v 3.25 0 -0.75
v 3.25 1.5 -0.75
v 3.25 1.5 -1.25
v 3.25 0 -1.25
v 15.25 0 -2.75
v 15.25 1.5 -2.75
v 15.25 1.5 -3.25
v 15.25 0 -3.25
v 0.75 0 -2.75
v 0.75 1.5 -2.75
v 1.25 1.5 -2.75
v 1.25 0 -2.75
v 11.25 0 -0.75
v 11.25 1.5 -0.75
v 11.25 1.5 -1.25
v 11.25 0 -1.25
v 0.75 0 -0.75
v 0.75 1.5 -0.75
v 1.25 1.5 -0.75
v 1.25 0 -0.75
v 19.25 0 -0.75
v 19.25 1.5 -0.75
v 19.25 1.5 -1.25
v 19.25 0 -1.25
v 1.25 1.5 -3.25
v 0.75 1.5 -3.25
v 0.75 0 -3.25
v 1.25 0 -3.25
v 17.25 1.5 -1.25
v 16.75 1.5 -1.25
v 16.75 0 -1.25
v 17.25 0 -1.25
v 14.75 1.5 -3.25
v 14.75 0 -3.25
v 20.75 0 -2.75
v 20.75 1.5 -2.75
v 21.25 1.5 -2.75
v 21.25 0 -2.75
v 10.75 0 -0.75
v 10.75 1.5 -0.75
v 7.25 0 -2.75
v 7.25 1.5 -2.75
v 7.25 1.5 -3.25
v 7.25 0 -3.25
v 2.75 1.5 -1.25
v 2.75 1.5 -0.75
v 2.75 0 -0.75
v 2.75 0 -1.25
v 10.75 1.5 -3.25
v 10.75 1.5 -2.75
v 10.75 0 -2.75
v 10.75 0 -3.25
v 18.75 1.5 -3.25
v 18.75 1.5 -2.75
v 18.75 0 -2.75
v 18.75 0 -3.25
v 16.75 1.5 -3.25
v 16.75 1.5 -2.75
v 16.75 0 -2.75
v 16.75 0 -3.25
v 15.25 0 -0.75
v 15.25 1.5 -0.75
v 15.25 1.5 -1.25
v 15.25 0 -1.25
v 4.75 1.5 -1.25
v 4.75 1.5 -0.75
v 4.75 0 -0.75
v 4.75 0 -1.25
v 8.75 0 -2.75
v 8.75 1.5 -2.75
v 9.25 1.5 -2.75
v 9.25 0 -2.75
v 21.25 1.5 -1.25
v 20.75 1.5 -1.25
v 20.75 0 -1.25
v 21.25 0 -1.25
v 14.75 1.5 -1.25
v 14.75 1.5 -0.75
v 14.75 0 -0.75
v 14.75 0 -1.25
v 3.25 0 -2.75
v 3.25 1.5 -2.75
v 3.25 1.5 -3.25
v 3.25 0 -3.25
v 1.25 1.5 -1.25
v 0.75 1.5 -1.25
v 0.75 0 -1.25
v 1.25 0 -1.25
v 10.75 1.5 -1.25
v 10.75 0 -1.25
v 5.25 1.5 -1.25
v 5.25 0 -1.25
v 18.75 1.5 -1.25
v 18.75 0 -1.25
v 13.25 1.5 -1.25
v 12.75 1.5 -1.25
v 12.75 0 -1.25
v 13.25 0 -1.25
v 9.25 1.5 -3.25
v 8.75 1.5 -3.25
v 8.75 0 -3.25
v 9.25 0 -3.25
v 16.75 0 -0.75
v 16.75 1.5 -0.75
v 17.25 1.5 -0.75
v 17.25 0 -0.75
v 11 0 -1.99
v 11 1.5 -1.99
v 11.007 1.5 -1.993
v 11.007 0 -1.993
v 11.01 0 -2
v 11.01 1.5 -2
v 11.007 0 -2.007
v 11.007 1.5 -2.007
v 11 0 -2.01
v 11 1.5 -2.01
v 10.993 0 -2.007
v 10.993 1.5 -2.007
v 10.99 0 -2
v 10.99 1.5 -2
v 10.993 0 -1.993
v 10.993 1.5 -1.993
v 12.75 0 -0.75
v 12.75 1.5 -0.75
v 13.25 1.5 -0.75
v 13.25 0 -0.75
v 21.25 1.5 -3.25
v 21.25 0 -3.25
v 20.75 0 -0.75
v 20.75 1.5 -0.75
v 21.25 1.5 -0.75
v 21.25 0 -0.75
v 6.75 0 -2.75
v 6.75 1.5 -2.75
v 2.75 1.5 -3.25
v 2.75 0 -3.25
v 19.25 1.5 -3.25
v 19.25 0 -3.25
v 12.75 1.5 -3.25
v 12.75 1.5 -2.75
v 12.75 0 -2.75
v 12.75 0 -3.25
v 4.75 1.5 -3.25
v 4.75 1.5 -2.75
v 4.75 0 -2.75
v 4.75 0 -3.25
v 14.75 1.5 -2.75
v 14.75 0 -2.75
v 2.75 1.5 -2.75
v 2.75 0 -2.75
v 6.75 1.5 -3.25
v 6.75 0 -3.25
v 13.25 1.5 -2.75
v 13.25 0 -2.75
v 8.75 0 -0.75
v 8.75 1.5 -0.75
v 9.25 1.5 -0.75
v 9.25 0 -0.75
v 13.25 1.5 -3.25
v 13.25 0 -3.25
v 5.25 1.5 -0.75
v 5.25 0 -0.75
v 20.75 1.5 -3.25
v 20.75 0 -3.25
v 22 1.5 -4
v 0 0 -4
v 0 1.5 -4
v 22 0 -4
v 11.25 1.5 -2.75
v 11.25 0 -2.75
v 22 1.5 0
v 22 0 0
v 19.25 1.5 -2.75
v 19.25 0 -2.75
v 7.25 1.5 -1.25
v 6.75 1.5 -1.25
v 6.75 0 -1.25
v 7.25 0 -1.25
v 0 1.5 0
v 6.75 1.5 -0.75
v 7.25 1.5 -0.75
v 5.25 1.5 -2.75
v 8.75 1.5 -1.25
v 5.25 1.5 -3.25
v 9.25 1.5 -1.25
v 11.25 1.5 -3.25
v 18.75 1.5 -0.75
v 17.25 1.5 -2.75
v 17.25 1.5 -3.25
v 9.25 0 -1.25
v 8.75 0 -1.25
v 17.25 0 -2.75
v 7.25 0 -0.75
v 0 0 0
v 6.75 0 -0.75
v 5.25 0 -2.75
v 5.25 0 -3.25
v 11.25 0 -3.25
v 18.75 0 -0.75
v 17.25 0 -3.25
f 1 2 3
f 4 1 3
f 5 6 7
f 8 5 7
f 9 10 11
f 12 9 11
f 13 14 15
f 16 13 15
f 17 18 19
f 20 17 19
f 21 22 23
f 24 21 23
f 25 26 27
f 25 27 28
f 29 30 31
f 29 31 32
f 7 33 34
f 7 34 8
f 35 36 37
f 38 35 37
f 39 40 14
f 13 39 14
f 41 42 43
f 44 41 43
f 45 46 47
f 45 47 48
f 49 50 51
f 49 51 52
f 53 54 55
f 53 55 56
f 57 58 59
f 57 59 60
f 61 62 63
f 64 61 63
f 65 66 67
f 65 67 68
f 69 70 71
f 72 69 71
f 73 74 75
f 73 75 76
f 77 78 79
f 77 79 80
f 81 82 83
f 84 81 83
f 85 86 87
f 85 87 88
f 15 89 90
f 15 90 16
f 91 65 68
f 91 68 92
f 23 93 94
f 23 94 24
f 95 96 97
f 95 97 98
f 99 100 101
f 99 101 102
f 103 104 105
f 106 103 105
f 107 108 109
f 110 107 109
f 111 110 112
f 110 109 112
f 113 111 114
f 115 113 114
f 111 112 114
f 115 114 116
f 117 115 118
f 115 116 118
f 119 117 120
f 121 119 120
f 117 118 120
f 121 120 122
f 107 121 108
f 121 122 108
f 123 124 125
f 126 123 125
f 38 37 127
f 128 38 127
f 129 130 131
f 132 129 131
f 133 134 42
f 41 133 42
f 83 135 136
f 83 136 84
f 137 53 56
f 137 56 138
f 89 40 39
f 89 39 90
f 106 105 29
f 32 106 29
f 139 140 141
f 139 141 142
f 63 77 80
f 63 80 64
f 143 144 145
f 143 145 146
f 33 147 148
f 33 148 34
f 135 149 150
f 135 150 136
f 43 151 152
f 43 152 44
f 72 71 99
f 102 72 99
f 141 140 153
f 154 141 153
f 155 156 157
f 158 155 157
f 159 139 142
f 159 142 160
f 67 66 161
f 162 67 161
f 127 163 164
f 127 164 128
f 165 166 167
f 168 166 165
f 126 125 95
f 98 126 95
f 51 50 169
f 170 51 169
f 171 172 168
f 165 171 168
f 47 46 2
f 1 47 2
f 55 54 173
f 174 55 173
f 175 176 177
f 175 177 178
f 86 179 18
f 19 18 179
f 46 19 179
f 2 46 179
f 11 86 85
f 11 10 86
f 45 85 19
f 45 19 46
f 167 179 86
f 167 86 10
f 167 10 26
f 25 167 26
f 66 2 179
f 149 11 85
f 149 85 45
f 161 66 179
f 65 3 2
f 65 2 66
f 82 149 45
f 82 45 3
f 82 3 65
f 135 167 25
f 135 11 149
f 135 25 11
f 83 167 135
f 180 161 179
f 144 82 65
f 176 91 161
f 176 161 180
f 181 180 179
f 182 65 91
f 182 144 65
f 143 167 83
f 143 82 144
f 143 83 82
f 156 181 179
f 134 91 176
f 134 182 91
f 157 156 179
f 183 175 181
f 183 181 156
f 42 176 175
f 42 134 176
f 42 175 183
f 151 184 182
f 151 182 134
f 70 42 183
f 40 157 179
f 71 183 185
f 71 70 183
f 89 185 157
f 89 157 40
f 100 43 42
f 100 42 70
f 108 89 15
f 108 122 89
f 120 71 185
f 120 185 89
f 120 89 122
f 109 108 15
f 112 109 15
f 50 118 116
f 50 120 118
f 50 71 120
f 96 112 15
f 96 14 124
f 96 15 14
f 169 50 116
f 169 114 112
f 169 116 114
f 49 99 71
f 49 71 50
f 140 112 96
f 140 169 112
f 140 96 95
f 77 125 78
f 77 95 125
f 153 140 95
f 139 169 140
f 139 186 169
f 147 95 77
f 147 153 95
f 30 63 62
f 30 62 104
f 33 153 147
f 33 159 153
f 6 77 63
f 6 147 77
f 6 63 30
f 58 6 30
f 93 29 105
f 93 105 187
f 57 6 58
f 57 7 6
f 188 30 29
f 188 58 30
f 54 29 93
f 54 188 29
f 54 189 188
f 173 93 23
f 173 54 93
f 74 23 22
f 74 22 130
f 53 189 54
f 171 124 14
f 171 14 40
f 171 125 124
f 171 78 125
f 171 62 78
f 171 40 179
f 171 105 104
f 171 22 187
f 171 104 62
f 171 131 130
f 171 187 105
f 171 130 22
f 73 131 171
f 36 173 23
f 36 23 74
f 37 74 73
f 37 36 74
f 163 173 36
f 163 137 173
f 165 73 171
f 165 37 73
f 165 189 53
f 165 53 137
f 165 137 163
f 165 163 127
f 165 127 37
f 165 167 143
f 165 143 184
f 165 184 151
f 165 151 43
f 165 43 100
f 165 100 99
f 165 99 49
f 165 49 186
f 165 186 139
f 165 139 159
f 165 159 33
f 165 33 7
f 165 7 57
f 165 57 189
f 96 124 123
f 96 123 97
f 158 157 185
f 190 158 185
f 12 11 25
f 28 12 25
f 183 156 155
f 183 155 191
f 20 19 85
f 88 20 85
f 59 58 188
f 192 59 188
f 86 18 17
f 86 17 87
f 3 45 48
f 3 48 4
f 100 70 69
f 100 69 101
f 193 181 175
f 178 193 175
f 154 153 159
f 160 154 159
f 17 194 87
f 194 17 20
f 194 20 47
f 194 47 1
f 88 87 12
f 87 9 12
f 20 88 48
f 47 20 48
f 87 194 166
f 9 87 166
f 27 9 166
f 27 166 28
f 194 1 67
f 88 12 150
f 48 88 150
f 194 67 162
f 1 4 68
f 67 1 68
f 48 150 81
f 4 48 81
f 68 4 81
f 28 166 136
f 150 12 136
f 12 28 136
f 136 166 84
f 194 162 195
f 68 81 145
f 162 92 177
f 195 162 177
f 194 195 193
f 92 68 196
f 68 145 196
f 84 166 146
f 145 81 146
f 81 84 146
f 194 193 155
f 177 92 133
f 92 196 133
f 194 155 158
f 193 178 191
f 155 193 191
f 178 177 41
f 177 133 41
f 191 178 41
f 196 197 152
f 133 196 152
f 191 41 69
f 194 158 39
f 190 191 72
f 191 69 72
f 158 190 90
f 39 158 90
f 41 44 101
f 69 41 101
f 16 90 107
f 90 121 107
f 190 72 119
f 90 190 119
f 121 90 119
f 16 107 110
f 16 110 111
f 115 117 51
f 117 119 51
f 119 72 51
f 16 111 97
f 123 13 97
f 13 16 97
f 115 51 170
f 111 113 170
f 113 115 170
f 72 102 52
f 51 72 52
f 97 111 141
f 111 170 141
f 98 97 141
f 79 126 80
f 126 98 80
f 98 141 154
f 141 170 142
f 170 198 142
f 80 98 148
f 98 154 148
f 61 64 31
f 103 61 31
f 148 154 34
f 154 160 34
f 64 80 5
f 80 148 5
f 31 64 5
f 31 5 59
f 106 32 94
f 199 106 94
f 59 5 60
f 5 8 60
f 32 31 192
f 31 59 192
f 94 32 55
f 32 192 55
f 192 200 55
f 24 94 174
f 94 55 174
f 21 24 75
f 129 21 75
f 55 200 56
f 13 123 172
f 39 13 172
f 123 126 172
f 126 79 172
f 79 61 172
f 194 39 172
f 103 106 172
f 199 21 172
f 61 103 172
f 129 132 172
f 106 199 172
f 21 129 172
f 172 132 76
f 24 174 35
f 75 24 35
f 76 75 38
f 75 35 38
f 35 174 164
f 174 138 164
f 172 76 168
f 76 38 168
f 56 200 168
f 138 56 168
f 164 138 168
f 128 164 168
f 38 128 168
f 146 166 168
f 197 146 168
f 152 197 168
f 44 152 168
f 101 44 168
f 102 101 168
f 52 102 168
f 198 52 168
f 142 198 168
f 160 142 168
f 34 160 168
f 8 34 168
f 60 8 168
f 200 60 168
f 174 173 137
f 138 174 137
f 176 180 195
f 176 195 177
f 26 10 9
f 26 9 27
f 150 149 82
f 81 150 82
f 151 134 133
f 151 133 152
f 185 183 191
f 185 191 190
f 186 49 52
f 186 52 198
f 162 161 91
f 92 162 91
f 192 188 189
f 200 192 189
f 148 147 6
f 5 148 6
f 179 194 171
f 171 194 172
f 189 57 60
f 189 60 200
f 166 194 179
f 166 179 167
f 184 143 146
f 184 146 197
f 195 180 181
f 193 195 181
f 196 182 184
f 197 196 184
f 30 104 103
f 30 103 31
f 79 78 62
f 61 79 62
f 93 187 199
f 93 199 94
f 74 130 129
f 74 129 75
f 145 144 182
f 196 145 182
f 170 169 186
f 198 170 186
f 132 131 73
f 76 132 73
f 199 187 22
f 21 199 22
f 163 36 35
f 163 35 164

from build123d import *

# Parameters (mm, degrees)
SKETCH1_W           = 22
SKETCH1_H           = 4
BOSS_EXTRUDE1_DEPTH = 1.5
SKETCH2_W           = 0.5
SKETCH2_H           = 0.5
CUT_EXTRUDE1_DEPTH  = 2
SKETCH3_R           = 0.01
CUT_EXTRUDE2_DEPTH  = 1.5


with BuildPart() as part:
    # Sketch1 → Boss-Extrude1 (new body)
    with BuildSketch(Plane(origin=(0, 0, 0), x_dir=(1, 0, 0), z_dir=(0, 1, 0))):
        with Locations((11, 2)):
            Rectangle(SKETCH1_W, SKETCH1_H)
    extrude(amount=BOSS_EXTRUDE1_DEPTH)

    # Sketch2 → Cut-Extrude1 (cut)
    with BuildSketch(Plane(origin=(0, 1.5, 0), x_dir=(1, 0, 0), z_dir=(0, 1, 0))):
        with Locations((3, 3)):
            Rectangle(SKETCH2_W, SKETCH2_H)
        with Locations((1, 3)):
            Rectangle(SKETCH2_W, SKETCH2_H)
        with Locations((5, 3)):
            Rectangle(SKETCH2_W, SKETCH2_H)
        with Locations((7, 3)):
            Rectangle(SKETCH2_W, SKETCH2_H)
        with Locations((9, 3)):
            Rectangle(SKETCH2_W, SKETCH2_H)
        with Locations((11, 3)):
            Rectangle(SKETCH2_W, SKETCH2_H)
        with Locations((13, 3)):
            Rectangle(SKETCH2_W, SKETCH2_H)
        with Locations((15, 3)):
            Rectangle(SKETCH2_W, SKETCH2_H)
        with Locations((17, 3)):
            Rectangle(SKETCH2_W, SKETCH2_H)
        with Locations((19, 3)):
            Rectangle(SKETCH2_W, SKETCH2_H)
        with Locations((21, 3)):
            Rectangle(SKETCH2_W, SKETCH2_H)
        with Locations((1, 1)):
            Rectangle(SKETCH2_W, SKETCH2_H)
        with Locations((3, 1)):
            Rectangle(SKETCH2_W, SKETCH2_H)
        with Locations((5, 1)):
            Rectangle(SKETCH2_W, SKETCH2_H)
        with Locations((7, 1)):
            Rectangle(SKETCH2_W, SKETCH2_H)
        with Locations((9, 1)):
            Rectangle(SKETCH2_W, SKETCH2_H)
        with Locations((11, 1)):
            Rectangle(SKETCH2_W, SKETCH2_H)
        with Locations((13, 1)):
            Rectangle(SKETCH2_W, SKETCH2_H)
        with Locations((15, 1)):
            Rectangle(SKETCH2_W, SKETCH2_H)
        with Locations((17, 1)):
            Rectangle(SKETCH2_W, SKETCH2_H)
        with Locations((19, 1)):
            Rectangle(SKETCH2_W, SKETCH2_H)
        with Locations((21, 1)):
            Rectangle(SKETCH2_W, SKETCH2_H)
    extrude(amount=-CUT_EXTRUDE1_DEPTH, mode=Mode.SUBTRACT)

    # Sketch3 → Cut-Extrude2 (cut)
    with BuildSketch(Plane(origin=(0, 1.5, 0), x_dir=(1, 0, 0), z_dir=(0, 1, 0))):
        with Locations((11, 2)):
            Circle(SKETCH3_R)
    extrude(amount=-CUT_EXTRUDE2_DEPTH, mode=Mode.SUBTRACT)


solid = part.part
